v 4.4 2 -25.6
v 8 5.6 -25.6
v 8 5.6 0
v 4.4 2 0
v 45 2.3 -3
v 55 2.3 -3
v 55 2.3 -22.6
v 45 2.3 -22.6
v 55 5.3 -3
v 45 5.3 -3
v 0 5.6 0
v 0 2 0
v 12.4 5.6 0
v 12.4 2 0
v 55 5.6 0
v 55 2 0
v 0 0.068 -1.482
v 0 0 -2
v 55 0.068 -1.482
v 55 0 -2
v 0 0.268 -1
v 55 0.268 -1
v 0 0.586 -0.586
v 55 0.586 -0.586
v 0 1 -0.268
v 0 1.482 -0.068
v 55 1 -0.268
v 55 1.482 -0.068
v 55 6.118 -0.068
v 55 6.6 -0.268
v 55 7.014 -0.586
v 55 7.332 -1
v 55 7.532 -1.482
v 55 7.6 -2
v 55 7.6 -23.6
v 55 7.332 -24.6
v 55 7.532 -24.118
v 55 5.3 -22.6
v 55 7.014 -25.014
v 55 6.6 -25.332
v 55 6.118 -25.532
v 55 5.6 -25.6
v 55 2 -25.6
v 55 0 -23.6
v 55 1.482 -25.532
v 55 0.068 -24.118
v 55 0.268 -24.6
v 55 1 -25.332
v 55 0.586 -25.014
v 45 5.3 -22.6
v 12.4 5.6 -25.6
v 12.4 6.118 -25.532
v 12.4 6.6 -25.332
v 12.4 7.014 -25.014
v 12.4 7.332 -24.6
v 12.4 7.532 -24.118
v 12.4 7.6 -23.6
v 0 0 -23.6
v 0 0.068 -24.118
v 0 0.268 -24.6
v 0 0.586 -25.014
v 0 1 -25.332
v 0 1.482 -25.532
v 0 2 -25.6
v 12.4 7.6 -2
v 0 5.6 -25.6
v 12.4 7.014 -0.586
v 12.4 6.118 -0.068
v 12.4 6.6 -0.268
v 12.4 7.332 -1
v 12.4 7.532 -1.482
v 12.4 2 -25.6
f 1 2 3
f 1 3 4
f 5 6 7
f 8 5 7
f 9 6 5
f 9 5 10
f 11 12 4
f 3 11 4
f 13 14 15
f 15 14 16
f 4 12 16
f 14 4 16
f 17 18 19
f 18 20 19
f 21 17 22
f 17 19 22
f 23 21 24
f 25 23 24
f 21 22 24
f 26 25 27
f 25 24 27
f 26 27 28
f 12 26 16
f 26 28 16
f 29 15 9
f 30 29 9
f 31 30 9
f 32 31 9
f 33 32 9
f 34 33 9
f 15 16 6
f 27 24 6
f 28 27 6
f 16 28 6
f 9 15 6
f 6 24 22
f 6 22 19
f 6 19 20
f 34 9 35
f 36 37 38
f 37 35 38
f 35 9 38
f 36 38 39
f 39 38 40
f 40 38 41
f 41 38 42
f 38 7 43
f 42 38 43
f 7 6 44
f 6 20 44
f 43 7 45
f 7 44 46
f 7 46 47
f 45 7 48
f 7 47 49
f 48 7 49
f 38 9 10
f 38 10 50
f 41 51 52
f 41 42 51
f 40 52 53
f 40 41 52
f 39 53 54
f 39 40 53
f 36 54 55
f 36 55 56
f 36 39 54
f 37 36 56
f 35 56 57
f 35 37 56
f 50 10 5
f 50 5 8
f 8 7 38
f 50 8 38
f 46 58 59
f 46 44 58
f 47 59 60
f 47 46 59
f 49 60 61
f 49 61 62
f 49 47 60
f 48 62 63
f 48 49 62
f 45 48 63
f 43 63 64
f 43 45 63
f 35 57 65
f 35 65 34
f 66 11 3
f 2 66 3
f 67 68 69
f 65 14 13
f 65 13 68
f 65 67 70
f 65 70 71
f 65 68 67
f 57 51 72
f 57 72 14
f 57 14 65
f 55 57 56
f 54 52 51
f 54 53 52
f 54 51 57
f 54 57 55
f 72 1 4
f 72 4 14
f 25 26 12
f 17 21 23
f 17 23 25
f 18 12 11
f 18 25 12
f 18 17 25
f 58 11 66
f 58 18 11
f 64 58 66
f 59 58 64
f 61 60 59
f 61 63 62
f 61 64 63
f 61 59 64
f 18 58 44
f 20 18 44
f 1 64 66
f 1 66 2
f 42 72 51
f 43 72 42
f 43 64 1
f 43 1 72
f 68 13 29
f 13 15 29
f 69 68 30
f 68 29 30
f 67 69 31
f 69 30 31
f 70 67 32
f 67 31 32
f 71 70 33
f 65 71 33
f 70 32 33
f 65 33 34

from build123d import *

# Parameters (mm, degrees)
SKETCH1_W           = 55
SKETCH1_H           = 25.6
BOSS_EXTRUDE1_DEPTH = 7.6
CUT_EXTRUDE1_DEPTH  = 25.6
FILLET1_R           = 2
SKETCH3_W           = 19.6
SKETCH3_H           = 3
CUT_EXTRUDE2_DEPTH  = 10


with BuildPart() as part:
    # Sketch1 → Boss-Extrude1 (new body)
    with BuildSketch(Plane(origin=(0, 0, 0), x_dir=(1, 0, 0), z_dir=(0, 1, 0))):
        with Locations((27.5, 12.8)):
            Rectangle(SKETCH1_W, SKETCH1_H)
    extrude(amount=BOSS_EXTRUDE1_DEPTH)

    # Sketch2 → Cut-Extrude1 (cut)
    with BuildSketch(Plane(origin=(0, 0, -25.6), x_dir=(-1, 0, 0), z_dir=(0, 0, -1))):
        Polygon((-8, 5.6), (-4.4, 2), (-12.4, 2), (-12.4, 7.6), (0, 7.6), (0, 5.6), align=None)
    extrude(amount=-CUT_EXTRUDE1_DEPTH, mode=Mode.SUBTRACT)

    # Fillet1
    fillet1_edges = [part.edges().sort_by_distance(p)[0] for p in [
        (33.7, 7.6, -25.6),
        (33.7, 7.6, 0),
        (27.5, 0, -25.6),
        (27.5, 0, 0),
    ]]
    fillet(fillet1_edges, radius=FILLET1_R - 0.0001)  # a hair under: the kernel refuses the full size

    # Sketch3 → Cut-Extrude2 (cut)
    with BuildSketch(Plane(origin=(55, 0, 0), x_dir=(0, 0, -1), z_dir=(1, 0, 0))):
        with Locations((12.8, 3.8)):
            Rectangle(SKETCH3_W, SKETCH3_H)
    extrude(amount=-CUT_EXTRUDE2_DEPTH, mode=Mode.SUBTRACT)


solid = part.part
